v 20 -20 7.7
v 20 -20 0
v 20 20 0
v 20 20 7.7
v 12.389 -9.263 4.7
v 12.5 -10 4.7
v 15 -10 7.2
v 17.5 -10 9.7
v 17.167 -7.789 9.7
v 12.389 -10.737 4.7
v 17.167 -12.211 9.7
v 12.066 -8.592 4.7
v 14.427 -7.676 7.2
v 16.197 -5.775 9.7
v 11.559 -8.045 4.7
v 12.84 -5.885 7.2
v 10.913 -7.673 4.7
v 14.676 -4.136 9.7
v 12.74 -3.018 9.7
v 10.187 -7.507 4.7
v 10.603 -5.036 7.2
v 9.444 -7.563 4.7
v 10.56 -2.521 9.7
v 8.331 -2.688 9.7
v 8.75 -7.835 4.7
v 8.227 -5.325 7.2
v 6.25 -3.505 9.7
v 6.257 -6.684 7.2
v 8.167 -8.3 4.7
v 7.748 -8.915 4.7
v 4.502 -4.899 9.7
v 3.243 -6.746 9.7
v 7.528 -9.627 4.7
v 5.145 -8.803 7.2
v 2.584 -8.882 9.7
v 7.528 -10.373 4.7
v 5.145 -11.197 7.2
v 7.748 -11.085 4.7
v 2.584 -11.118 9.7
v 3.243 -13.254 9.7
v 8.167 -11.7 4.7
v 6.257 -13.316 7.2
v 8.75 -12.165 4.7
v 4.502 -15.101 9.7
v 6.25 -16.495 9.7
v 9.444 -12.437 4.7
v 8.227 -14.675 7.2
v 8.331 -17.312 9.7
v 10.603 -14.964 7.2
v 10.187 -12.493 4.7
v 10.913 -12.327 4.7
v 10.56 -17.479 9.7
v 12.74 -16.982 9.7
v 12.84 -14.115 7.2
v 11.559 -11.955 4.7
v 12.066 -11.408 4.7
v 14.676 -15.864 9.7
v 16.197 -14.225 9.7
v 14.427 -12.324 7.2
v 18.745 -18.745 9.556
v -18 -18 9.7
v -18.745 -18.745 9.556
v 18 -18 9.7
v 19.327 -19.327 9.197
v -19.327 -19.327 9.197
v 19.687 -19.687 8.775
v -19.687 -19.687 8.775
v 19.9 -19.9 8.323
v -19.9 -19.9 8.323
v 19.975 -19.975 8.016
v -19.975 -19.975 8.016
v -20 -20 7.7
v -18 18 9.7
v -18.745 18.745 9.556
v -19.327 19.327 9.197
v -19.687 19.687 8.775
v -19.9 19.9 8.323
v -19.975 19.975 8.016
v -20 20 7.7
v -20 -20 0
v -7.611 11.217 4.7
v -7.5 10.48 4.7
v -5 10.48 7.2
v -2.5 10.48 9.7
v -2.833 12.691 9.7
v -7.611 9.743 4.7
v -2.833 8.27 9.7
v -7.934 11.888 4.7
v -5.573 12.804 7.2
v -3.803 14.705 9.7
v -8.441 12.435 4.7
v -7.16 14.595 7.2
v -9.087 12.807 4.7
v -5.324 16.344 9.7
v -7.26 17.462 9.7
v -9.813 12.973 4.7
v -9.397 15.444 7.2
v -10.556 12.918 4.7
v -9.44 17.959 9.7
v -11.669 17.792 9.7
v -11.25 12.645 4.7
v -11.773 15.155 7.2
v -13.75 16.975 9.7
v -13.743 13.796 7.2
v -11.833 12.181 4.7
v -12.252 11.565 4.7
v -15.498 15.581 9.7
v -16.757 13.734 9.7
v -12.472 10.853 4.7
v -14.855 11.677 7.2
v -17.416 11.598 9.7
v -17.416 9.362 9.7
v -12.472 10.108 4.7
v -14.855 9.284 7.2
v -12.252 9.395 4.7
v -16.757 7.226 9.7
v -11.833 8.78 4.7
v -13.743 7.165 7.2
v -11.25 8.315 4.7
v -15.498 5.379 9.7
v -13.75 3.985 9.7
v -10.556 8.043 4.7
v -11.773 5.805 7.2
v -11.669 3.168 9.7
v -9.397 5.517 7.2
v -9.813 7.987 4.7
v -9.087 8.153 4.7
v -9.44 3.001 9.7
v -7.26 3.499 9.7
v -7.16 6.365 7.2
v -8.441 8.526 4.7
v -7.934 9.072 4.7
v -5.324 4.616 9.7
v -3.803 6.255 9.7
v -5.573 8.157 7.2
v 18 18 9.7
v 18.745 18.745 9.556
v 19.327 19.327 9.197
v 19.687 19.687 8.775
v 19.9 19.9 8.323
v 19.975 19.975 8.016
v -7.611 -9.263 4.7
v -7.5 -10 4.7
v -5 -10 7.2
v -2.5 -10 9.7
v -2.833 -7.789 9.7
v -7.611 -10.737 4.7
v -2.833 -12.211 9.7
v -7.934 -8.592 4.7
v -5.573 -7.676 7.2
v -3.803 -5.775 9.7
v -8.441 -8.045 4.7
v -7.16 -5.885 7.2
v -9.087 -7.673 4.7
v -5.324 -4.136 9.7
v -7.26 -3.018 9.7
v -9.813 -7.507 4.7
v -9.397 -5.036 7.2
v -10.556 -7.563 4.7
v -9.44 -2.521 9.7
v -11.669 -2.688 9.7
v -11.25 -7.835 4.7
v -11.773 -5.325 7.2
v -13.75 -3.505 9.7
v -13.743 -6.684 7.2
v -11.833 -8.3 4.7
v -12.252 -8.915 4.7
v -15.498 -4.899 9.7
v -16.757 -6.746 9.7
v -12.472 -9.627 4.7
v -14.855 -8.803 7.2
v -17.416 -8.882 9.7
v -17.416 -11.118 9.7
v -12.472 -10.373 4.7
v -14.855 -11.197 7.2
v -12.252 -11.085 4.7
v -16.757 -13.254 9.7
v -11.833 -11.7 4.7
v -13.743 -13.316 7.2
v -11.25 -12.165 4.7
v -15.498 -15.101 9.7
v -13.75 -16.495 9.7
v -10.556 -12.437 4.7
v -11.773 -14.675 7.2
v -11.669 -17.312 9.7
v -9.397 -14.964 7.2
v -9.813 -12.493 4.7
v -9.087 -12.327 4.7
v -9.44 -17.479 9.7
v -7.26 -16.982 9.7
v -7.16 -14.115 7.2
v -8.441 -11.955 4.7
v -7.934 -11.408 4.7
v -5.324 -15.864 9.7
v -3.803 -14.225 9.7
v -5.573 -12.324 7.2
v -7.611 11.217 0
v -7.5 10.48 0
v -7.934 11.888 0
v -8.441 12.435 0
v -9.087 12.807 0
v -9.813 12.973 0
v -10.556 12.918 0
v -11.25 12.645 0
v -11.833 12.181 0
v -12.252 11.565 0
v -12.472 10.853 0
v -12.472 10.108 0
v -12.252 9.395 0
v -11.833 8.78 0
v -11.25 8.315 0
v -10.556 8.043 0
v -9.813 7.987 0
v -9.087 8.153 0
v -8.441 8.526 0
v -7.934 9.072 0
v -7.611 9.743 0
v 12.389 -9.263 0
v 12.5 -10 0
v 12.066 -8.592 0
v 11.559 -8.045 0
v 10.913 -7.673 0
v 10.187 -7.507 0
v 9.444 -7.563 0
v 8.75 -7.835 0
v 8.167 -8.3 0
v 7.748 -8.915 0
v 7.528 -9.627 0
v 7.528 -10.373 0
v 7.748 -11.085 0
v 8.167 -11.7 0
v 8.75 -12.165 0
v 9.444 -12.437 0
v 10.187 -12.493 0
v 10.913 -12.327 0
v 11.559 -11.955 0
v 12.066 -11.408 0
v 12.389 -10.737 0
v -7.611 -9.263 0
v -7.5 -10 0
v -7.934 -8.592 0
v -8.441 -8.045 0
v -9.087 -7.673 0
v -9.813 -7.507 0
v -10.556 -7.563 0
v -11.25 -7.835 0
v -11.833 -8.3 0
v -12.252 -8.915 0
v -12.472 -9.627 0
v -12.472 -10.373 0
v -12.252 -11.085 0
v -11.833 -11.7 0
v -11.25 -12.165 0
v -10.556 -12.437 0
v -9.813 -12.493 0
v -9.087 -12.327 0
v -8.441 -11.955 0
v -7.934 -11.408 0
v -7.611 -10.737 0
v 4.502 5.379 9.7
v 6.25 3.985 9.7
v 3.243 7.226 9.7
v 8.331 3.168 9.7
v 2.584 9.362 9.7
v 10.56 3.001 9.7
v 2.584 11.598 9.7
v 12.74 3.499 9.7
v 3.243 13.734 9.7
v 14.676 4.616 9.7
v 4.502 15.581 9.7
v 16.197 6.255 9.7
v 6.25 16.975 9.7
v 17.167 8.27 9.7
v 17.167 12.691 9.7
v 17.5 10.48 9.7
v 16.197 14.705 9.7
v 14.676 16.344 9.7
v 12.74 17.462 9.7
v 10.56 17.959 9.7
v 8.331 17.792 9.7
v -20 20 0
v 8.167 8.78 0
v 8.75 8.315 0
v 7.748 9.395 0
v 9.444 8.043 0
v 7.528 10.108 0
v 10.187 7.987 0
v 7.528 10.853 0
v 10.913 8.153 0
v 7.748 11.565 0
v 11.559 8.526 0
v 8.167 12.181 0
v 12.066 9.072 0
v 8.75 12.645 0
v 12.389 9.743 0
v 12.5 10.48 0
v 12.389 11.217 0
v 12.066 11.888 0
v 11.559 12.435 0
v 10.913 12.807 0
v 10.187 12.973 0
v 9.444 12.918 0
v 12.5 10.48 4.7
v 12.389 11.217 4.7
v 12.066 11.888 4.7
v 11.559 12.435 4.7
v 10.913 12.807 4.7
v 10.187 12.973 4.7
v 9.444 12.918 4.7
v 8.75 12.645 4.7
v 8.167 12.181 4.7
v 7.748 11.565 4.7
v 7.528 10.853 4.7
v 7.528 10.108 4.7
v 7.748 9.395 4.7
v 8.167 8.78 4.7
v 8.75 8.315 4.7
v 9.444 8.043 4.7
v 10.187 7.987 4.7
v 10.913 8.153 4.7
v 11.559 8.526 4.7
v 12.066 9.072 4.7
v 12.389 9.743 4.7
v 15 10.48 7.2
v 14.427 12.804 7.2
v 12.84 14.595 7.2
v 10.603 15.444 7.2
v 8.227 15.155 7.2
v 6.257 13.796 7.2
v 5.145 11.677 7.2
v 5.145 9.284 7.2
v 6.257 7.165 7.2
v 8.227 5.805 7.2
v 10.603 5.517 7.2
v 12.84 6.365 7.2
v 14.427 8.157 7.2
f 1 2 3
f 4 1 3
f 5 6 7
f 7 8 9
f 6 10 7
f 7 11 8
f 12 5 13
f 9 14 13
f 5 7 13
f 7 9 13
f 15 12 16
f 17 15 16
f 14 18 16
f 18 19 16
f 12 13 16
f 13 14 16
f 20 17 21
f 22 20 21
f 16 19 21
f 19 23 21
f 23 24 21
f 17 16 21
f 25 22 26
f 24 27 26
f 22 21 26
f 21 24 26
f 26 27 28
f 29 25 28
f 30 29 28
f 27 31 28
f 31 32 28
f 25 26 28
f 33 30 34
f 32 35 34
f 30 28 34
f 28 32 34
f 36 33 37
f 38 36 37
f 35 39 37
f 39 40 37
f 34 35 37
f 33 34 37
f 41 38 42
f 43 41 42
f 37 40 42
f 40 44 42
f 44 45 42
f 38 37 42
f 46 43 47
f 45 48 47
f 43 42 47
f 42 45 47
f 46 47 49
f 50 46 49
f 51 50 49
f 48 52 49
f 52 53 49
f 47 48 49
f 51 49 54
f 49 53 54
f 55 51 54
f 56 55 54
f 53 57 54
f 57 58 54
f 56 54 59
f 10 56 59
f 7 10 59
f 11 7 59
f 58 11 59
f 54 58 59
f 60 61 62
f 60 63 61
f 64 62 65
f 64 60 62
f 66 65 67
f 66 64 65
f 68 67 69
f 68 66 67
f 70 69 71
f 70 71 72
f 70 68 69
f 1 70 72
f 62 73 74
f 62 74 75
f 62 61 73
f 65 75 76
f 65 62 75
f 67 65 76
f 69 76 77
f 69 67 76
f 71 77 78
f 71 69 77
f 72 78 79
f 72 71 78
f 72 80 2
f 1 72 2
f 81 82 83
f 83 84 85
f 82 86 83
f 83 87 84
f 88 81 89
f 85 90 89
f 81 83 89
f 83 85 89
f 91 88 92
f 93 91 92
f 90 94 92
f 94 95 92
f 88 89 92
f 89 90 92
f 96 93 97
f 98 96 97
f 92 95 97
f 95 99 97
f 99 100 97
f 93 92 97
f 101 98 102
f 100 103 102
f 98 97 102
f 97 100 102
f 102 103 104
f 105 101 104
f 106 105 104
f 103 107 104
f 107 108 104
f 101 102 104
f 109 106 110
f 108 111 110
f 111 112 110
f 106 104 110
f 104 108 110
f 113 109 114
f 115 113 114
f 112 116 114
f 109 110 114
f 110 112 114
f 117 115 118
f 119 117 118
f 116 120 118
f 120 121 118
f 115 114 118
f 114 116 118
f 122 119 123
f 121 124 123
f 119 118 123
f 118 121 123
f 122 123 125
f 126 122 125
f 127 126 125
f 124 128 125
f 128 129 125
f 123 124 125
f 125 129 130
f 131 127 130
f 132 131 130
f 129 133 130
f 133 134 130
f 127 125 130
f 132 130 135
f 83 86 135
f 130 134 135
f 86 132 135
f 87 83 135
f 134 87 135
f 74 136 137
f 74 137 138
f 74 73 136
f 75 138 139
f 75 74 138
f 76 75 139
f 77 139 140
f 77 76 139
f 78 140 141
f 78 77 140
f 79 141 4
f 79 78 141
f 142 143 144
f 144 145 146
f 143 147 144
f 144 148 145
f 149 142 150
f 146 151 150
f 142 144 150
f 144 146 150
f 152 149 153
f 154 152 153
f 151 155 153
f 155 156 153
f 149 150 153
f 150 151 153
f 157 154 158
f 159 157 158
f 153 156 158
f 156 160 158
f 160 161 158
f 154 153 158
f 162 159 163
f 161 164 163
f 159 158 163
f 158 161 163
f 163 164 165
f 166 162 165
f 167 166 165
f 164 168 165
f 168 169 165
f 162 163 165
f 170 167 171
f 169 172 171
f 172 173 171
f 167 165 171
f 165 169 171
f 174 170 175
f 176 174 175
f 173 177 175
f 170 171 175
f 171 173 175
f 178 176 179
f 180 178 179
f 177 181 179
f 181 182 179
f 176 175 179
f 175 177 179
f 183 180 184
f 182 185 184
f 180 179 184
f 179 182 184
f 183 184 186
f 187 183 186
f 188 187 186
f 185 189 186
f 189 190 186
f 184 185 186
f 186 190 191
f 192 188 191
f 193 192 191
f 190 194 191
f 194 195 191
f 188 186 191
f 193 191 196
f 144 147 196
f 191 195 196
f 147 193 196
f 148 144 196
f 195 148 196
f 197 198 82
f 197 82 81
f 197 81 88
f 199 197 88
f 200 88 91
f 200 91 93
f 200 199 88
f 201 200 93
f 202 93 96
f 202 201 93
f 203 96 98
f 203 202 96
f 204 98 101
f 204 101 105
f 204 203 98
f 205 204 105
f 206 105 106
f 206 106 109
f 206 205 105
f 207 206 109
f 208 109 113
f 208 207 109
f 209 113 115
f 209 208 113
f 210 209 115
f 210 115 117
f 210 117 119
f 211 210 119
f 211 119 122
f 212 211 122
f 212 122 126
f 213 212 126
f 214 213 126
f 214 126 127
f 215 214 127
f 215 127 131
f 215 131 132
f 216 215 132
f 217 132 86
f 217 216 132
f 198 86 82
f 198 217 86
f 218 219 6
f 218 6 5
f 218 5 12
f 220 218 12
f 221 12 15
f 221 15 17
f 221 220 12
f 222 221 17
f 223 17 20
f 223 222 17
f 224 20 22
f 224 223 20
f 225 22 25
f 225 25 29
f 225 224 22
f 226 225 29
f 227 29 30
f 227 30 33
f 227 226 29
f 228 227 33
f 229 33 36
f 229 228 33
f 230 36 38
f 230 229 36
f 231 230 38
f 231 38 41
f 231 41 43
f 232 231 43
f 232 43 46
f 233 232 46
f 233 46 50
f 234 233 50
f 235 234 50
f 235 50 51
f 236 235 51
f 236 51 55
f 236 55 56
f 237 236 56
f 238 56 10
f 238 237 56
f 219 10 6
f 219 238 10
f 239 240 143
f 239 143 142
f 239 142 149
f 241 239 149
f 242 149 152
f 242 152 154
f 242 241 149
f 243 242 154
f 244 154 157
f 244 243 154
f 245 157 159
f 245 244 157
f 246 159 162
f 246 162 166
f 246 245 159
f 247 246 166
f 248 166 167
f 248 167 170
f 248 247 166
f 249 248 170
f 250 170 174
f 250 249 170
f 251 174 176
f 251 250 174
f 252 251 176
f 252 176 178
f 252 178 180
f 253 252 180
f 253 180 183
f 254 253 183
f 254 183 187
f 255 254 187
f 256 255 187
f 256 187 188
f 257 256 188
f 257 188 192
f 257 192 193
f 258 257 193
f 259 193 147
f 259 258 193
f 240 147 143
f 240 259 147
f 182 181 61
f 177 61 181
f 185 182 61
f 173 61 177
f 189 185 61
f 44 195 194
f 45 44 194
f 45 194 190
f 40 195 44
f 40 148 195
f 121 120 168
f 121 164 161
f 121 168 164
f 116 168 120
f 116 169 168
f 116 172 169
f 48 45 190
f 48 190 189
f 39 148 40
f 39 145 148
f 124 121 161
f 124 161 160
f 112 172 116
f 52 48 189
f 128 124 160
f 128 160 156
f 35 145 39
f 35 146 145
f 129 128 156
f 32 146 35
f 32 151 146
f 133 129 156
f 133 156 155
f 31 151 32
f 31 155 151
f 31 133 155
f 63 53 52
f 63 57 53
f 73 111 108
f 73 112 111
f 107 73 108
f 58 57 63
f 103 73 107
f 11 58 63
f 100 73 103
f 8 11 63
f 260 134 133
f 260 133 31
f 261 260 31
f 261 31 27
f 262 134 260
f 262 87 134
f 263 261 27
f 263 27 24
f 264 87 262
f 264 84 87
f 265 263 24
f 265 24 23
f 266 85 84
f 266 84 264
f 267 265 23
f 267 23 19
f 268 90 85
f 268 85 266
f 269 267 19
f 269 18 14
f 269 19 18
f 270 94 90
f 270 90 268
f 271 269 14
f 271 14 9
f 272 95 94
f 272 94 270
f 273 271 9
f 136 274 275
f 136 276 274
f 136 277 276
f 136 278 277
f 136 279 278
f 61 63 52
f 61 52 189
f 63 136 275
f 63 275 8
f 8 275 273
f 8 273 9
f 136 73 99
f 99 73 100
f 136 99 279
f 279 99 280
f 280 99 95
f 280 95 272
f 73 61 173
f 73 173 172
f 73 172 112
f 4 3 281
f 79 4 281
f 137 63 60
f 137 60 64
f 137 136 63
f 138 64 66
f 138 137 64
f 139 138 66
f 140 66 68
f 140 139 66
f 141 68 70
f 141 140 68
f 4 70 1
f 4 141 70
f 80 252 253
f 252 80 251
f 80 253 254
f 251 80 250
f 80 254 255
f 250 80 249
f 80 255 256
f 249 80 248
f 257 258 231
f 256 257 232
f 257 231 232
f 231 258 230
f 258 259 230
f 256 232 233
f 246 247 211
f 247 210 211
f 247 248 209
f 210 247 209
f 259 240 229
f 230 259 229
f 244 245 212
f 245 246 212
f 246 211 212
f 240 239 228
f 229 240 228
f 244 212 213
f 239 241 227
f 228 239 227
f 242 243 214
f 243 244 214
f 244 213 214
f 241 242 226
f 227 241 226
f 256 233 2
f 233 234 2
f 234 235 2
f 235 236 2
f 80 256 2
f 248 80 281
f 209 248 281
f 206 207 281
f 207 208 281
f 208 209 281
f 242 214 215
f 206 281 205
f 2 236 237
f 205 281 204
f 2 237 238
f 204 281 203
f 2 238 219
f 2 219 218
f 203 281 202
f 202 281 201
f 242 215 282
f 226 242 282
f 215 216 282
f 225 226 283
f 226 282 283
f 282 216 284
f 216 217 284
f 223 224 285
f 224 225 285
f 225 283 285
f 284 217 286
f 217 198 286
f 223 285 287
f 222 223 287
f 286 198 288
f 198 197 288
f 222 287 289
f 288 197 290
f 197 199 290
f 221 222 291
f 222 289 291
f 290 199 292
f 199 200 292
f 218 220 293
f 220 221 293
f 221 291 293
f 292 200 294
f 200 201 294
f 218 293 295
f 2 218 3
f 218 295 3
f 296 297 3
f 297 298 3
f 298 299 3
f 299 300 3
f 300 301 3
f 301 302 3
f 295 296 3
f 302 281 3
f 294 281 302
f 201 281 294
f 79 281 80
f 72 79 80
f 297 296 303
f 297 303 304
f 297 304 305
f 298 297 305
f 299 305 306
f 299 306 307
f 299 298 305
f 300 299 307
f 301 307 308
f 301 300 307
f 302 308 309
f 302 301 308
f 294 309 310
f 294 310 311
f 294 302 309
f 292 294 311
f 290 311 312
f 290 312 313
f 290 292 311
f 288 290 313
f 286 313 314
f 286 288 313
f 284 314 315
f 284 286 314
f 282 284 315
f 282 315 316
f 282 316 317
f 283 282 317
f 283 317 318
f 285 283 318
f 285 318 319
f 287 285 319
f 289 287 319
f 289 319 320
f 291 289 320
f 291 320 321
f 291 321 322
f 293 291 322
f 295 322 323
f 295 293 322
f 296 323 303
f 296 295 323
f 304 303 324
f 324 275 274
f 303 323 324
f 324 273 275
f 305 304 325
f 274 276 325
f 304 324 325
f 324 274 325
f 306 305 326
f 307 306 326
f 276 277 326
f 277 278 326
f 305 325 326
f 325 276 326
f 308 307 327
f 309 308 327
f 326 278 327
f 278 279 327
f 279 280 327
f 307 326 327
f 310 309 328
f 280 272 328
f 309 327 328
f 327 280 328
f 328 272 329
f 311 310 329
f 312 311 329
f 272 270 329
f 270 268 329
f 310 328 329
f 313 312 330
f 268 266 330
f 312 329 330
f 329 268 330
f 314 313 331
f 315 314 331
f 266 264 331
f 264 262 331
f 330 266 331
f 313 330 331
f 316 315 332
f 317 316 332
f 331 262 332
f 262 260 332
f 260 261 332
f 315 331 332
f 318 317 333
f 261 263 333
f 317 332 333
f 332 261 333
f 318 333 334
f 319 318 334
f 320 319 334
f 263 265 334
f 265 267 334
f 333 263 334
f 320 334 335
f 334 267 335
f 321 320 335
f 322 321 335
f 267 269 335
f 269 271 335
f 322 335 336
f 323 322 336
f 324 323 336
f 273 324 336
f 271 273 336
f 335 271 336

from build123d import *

# Parameters (mm, degrees)
F0_R     = 2.5
F1_DEPTH = 9.7
F2_SIZE  = 5
F3_R     = 2


with BuildPart() as f1:
    # F0 (on Top) → F1 (new body)
    with BuildSketch(Plane.XY):
        Polygon((-20, 10.480181), (-20, -20), (-10, -20), (0, -20), (20, -20), (20, 20), (10, 20), (-10, 20), (-20, 20), align=None)
        with Locations((-10, -10)):
            Circle(F0_R, mode=Mode.SUBTRACT)
        with Locations((10, -10)):
            Circle(F0_R, mode=Mode.SUBTRACT)
        with Locations((-10, 10.480181)):
            Circle(F0_R, mode=Mode.SUBTRACT)
        with Locations((10, 10.480181)):
            Circle(F0_R, mode=Mode.SUBTRACT)
    extrude(amount=F1_DEPTH)

    # F2
    f2_edges = [f1.edges().sort_by_distance(p)[0] for p in [
        (-12.5, 10.480181, 9.7),
        (7.5, 10.480181, 9.7),
        (7.5, -10, 9.7),
        (-12.5, -10, 9.7),
    ]]
    chamfer(f2_edges, length=F2_SIZE)

    # F3
    f3_edges = [f1.edges().sort_by_distance(p)[0] for p in [
        (0, -20, 9.7),
        (20, 0, 9.7),
        (0, 20, 9.7),
        (-20, 0, 9.7),
    ]]
    fillet(f3_edges, radius=F3_R)


solid = f1.part
